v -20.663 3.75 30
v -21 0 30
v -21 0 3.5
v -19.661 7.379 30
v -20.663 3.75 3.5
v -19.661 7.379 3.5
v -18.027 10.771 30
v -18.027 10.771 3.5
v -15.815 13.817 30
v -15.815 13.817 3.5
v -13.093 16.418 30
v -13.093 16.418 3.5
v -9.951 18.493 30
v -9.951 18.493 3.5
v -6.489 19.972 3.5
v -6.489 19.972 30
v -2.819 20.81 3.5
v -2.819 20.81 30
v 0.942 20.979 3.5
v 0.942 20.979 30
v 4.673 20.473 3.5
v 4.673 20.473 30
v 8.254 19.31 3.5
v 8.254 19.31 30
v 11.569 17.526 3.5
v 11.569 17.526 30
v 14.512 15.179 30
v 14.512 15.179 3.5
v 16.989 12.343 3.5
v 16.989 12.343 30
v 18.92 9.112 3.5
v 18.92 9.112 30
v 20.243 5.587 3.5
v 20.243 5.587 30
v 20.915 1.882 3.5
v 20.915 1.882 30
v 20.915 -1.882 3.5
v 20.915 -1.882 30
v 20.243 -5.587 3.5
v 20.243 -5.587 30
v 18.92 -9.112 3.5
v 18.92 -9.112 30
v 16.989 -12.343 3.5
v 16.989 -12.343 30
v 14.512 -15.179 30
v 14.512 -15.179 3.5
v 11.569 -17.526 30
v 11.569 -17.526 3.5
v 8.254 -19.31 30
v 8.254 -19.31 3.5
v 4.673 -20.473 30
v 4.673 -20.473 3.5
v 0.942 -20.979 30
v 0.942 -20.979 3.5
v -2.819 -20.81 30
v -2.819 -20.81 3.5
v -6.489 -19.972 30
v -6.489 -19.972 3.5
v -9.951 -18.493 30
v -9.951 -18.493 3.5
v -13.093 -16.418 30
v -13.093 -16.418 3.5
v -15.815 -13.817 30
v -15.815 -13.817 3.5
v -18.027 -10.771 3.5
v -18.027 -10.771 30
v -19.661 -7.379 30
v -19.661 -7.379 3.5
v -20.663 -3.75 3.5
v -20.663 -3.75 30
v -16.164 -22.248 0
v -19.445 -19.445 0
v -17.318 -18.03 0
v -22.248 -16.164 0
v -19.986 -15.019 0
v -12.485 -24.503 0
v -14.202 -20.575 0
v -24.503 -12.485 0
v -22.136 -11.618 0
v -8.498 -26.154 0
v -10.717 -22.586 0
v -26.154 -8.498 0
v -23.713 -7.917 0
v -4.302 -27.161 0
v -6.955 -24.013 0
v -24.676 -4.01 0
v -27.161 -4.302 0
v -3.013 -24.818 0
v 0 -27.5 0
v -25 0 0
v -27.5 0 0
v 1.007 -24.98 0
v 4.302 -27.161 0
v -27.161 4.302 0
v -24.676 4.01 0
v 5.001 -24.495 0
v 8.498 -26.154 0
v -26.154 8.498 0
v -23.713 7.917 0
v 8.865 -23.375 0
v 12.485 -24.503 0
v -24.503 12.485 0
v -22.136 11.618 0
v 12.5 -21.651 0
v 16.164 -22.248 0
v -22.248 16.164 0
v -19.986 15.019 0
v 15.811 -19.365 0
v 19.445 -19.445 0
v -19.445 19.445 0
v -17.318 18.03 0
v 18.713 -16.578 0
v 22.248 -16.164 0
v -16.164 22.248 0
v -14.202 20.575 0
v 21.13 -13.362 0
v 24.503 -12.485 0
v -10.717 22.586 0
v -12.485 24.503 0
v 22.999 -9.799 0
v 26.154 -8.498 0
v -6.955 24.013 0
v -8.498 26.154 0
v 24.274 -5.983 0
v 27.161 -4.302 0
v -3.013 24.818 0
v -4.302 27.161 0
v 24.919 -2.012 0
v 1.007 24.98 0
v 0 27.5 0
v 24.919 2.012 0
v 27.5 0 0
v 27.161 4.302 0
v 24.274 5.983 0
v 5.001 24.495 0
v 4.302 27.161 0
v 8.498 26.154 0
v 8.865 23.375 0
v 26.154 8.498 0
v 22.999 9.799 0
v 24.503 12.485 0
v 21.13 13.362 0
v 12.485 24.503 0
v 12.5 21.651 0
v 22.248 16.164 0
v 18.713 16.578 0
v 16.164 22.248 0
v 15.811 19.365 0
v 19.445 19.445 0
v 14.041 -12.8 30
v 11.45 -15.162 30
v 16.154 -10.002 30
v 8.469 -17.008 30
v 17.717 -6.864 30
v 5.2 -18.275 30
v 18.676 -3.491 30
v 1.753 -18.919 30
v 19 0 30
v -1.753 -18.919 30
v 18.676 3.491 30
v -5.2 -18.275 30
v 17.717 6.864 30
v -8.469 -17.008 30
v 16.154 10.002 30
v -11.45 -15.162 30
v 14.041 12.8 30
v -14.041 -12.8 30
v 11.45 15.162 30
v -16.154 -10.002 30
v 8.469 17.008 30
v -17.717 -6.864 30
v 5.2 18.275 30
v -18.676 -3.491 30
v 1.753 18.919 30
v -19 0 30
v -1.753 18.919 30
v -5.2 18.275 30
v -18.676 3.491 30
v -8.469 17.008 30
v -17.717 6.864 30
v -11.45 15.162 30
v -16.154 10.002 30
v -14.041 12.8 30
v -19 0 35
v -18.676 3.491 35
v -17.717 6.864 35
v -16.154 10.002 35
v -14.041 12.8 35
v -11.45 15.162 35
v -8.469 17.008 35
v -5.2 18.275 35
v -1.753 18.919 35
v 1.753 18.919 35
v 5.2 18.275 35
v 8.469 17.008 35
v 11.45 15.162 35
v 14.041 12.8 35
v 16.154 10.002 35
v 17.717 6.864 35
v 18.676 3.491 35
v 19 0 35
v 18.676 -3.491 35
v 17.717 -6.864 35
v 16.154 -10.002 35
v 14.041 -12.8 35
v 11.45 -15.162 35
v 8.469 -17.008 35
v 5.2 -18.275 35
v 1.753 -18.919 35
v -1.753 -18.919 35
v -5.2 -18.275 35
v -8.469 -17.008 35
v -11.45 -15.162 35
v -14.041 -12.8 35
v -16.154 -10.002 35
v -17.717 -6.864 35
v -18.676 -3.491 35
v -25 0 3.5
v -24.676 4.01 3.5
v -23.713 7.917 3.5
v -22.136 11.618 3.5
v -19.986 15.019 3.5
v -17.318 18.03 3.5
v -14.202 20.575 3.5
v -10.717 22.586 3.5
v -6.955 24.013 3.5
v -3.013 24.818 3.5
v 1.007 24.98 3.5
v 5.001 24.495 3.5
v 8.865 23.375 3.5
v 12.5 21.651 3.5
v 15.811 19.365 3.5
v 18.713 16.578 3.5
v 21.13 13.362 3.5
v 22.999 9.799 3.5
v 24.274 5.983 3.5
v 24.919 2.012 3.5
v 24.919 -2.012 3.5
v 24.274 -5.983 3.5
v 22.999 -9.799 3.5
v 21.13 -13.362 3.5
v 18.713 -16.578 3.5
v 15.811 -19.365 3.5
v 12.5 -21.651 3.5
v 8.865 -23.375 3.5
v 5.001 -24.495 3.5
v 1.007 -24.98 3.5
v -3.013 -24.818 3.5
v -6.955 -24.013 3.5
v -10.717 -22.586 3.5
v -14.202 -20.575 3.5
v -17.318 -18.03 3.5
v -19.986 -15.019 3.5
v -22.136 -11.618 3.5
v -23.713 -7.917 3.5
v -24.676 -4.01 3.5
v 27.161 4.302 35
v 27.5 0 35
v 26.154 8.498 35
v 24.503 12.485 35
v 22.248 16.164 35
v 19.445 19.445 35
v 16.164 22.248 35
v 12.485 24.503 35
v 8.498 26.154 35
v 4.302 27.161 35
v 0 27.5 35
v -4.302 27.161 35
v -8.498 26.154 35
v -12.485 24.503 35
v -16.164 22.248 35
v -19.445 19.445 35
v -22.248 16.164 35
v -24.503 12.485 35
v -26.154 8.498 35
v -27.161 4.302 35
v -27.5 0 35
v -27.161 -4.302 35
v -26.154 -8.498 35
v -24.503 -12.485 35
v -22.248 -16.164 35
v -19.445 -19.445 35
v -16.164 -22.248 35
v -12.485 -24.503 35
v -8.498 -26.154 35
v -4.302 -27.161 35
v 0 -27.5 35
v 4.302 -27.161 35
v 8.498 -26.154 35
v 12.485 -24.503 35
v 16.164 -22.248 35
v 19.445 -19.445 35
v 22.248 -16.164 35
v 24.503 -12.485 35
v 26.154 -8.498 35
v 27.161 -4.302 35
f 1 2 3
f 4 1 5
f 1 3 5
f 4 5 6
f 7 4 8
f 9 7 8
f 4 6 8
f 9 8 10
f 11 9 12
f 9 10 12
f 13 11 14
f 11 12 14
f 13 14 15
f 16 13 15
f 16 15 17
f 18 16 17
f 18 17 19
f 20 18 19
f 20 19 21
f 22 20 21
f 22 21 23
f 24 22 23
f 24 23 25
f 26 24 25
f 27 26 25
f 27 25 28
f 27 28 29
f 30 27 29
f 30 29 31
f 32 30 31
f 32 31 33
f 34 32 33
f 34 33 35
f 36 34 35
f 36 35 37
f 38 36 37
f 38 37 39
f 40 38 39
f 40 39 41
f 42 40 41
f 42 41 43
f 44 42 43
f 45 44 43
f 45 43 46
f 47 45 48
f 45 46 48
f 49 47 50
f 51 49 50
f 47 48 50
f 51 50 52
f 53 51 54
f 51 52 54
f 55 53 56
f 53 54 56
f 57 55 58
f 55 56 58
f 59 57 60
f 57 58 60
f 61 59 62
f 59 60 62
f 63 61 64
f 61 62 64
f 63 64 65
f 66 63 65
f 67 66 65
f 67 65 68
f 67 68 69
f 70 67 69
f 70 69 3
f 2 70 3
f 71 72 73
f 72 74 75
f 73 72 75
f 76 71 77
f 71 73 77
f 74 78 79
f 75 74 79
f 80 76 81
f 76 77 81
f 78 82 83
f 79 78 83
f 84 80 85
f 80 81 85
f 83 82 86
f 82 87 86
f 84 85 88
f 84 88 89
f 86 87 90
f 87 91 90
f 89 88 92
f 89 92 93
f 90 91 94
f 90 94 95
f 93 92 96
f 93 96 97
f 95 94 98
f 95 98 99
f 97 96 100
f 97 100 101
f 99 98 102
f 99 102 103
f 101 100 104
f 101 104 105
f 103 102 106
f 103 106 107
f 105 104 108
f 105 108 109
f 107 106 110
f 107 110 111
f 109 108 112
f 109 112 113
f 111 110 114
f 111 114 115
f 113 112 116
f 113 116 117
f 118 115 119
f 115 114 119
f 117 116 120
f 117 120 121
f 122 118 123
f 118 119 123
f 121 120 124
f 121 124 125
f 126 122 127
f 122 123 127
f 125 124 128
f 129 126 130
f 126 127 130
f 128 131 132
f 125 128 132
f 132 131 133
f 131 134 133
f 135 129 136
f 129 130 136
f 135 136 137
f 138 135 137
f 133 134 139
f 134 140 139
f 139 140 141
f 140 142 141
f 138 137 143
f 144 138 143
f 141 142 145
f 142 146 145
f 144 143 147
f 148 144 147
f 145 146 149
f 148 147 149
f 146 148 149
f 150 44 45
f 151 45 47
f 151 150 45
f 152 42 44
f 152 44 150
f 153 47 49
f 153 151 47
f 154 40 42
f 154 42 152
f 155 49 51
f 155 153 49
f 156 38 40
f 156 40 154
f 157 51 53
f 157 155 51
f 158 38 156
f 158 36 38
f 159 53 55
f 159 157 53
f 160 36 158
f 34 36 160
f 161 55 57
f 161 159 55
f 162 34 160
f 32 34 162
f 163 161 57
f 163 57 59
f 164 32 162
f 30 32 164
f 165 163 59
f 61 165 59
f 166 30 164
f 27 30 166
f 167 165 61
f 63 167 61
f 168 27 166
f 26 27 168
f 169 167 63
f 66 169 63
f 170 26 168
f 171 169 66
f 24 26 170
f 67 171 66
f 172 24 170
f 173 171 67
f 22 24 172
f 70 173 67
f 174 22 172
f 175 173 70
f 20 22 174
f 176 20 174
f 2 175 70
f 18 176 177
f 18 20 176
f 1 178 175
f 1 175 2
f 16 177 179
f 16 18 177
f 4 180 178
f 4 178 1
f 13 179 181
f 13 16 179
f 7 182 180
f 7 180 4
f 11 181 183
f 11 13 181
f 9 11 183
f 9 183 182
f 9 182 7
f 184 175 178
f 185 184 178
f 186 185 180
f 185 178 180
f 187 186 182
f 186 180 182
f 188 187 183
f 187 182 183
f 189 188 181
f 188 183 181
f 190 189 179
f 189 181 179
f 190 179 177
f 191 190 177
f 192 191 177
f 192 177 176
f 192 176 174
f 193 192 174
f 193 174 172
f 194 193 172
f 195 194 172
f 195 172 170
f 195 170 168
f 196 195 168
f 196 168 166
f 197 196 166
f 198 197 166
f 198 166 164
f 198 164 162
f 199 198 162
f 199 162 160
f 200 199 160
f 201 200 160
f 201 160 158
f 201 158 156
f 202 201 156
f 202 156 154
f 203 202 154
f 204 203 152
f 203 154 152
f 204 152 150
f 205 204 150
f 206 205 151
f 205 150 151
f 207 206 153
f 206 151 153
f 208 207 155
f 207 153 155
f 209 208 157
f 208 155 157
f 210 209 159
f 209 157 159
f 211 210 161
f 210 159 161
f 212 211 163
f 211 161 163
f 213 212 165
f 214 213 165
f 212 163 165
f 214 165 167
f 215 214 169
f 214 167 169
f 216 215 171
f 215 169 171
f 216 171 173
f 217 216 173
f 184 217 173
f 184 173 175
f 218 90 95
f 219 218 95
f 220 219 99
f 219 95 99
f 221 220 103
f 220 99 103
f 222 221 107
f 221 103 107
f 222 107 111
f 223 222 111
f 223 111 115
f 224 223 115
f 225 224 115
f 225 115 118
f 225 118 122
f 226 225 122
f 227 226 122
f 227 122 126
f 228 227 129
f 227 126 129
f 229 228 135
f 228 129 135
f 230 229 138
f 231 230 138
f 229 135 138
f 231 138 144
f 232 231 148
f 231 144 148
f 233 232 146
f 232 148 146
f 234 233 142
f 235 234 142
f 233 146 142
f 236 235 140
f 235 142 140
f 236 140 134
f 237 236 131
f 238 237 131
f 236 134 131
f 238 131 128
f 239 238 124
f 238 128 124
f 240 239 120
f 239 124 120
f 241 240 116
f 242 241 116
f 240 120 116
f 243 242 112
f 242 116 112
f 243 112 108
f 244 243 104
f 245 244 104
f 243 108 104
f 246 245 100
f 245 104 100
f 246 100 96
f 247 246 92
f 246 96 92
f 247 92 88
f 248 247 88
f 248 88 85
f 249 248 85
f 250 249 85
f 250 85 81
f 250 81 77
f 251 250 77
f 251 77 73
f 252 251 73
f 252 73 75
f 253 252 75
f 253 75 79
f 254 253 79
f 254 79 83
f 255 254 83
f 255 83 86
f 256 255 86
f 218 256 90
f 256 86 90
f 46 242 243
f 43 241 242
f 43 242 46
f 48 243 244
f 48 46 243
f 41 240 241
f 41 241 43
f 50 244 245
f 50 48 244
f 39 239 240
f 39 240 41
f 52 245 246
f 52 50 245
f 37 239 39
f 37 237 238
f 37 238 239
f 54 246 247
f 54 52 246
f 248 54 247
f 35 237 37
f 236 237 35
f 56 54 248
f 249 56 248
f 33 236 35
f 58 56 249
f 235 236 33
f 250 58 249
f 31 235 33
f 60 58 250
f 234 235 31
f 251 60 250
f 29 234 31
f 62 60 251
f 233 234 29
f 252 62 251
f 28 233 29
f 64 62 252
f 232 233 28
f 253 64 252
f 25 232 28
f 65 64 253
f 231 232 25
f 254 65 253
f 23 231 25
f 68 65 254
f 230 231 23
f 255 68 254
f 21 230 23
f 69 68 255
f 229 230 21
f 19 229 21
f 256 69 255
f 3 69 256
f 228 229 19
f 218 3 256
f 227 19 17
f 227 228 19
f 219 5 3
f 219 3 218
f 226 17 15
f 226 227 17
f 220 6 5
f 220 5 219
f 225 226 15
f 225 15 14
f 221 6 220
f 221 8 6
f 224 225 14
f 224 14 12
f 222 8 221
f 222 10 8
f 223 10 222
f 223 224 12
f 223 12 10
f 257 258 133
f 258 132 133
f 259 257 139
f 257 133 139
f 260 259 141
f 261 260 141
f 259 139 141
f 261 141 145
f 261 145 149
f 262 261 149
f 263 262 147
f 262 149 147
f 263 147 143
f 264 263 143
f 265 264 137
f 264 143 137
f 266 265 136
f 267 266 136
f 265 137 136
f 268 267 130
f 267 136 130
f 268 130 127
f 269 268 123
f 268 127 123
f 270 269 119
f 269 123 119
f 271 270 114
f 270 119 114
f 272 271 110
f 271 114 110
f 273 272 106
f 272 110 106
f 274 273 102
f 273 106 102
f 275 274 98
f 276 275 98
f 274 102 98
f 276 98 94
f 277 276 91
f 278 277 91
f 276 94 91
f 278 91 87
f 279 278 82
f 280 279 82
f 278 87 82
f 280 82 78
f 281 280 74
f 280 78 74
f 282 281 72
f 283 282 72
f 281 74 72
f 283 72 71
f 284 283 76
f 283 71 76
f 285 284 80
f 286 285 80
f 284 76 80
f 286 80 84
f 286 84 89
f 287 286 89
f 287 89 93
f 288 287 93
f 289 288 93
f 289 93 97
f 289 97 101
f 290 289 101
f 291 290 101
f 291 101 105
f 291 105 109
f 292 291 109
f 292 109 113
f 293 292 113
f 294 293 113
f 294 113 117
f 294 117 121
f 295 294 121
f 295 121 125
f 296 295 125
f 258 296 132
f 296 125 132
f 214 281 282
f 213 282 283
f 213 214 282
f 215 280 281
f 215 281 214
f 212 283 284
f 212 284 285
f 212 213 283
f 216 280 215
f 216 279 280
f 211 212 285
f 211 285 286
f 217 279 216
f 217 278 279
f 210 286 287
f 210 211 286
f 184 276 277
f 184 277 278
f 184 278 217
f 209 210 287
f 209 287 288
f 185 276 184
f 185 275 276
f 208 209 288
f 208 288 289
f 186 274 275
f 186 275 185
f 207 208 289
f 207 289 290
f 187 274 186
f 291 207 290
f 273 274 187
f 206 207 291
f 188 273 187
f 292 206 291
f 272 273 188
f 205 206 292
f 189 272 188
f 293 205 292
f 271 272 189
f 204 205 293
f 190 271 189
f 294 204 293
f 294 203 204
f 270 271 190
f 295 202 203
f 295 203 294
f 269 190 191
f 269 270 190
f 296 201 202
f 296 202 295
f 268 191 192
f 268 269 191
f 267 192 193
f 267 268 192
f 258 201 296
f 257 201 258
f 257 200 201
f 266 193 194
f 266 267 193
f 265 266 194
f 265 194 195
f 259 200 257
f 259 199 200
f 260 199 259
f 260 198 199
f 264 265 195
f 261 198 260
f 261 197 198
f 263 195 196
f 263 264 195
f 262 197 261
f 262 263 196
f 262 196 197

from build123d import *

# Parameters (mm, degrees)
SKETCH_1_R          = 27.5
EXTRUDE_1_DEPTH     = 3
SKETCH_2_R          = 27.5
EXTRUDE_2_DEPTH     = 32
SKETCH_3_R          = 21
CUT_EXTRUDE_1_DEPTH = 30
SKETCH_4_R          = 19
CUT_EXTRUDE_2_DEPTH = 30
SKETCH_5_R          = 25
CUT_EXTRUDE_3_DEPTH = 3.5


with BuildPart() as part:
    # 草图1 → 拉伸1 (new body)
    with BuildSketch(Plane.XY):
        Circle(SKETCH_1_R)
    extrude(amount=EXTRUDE_1_DEPTH)

    # 草图2 → 拉伸2 (add)
    with BuildSketch(Plane.XY.offset(3)):
        Circle(SKETCH_2_R)
    extrude(amount=EXTRUDE_2_DEPTH)

    # 草图3 → 切除-拉伸1 (cut)
    with BuildSketch(Plane(origin=(0, 0, 0), x_dir=(-1, 0, 0), z_dir=(0, 0, -1))):
        Circle(SKETCH_3_R)
    extrude(amount=-CUT_EXTRUDE_1_DEPTH, mode=Mode.SUBTRACT)

    # 草图4 → 切除-拉伸2 (cut)
    with BuildSketch(Plane(origin=(0, 0, 30), x_dir=(-1, 0, 0), z_dir=(0, 0, -1))):
        Circle(SKETCH_4_R)
    extrude(amount=-CUT_EXTRUDE_2_DEPTH, mode=Mode.SUBTRACT)

    # 草图5 → 切除-拉伸3 (cut)
    with BuildSketch(Plane(origin=(0, 0, 0), x_dir=(-1, 0, 0), z_dir=(0, 0, -1))):
        Circle(SKETCH_5_R)
    extrude(amount=-CUT_EXTRUDE_3_DEPTH, mode=Mode.SUBTRACT)


solid = part.part
